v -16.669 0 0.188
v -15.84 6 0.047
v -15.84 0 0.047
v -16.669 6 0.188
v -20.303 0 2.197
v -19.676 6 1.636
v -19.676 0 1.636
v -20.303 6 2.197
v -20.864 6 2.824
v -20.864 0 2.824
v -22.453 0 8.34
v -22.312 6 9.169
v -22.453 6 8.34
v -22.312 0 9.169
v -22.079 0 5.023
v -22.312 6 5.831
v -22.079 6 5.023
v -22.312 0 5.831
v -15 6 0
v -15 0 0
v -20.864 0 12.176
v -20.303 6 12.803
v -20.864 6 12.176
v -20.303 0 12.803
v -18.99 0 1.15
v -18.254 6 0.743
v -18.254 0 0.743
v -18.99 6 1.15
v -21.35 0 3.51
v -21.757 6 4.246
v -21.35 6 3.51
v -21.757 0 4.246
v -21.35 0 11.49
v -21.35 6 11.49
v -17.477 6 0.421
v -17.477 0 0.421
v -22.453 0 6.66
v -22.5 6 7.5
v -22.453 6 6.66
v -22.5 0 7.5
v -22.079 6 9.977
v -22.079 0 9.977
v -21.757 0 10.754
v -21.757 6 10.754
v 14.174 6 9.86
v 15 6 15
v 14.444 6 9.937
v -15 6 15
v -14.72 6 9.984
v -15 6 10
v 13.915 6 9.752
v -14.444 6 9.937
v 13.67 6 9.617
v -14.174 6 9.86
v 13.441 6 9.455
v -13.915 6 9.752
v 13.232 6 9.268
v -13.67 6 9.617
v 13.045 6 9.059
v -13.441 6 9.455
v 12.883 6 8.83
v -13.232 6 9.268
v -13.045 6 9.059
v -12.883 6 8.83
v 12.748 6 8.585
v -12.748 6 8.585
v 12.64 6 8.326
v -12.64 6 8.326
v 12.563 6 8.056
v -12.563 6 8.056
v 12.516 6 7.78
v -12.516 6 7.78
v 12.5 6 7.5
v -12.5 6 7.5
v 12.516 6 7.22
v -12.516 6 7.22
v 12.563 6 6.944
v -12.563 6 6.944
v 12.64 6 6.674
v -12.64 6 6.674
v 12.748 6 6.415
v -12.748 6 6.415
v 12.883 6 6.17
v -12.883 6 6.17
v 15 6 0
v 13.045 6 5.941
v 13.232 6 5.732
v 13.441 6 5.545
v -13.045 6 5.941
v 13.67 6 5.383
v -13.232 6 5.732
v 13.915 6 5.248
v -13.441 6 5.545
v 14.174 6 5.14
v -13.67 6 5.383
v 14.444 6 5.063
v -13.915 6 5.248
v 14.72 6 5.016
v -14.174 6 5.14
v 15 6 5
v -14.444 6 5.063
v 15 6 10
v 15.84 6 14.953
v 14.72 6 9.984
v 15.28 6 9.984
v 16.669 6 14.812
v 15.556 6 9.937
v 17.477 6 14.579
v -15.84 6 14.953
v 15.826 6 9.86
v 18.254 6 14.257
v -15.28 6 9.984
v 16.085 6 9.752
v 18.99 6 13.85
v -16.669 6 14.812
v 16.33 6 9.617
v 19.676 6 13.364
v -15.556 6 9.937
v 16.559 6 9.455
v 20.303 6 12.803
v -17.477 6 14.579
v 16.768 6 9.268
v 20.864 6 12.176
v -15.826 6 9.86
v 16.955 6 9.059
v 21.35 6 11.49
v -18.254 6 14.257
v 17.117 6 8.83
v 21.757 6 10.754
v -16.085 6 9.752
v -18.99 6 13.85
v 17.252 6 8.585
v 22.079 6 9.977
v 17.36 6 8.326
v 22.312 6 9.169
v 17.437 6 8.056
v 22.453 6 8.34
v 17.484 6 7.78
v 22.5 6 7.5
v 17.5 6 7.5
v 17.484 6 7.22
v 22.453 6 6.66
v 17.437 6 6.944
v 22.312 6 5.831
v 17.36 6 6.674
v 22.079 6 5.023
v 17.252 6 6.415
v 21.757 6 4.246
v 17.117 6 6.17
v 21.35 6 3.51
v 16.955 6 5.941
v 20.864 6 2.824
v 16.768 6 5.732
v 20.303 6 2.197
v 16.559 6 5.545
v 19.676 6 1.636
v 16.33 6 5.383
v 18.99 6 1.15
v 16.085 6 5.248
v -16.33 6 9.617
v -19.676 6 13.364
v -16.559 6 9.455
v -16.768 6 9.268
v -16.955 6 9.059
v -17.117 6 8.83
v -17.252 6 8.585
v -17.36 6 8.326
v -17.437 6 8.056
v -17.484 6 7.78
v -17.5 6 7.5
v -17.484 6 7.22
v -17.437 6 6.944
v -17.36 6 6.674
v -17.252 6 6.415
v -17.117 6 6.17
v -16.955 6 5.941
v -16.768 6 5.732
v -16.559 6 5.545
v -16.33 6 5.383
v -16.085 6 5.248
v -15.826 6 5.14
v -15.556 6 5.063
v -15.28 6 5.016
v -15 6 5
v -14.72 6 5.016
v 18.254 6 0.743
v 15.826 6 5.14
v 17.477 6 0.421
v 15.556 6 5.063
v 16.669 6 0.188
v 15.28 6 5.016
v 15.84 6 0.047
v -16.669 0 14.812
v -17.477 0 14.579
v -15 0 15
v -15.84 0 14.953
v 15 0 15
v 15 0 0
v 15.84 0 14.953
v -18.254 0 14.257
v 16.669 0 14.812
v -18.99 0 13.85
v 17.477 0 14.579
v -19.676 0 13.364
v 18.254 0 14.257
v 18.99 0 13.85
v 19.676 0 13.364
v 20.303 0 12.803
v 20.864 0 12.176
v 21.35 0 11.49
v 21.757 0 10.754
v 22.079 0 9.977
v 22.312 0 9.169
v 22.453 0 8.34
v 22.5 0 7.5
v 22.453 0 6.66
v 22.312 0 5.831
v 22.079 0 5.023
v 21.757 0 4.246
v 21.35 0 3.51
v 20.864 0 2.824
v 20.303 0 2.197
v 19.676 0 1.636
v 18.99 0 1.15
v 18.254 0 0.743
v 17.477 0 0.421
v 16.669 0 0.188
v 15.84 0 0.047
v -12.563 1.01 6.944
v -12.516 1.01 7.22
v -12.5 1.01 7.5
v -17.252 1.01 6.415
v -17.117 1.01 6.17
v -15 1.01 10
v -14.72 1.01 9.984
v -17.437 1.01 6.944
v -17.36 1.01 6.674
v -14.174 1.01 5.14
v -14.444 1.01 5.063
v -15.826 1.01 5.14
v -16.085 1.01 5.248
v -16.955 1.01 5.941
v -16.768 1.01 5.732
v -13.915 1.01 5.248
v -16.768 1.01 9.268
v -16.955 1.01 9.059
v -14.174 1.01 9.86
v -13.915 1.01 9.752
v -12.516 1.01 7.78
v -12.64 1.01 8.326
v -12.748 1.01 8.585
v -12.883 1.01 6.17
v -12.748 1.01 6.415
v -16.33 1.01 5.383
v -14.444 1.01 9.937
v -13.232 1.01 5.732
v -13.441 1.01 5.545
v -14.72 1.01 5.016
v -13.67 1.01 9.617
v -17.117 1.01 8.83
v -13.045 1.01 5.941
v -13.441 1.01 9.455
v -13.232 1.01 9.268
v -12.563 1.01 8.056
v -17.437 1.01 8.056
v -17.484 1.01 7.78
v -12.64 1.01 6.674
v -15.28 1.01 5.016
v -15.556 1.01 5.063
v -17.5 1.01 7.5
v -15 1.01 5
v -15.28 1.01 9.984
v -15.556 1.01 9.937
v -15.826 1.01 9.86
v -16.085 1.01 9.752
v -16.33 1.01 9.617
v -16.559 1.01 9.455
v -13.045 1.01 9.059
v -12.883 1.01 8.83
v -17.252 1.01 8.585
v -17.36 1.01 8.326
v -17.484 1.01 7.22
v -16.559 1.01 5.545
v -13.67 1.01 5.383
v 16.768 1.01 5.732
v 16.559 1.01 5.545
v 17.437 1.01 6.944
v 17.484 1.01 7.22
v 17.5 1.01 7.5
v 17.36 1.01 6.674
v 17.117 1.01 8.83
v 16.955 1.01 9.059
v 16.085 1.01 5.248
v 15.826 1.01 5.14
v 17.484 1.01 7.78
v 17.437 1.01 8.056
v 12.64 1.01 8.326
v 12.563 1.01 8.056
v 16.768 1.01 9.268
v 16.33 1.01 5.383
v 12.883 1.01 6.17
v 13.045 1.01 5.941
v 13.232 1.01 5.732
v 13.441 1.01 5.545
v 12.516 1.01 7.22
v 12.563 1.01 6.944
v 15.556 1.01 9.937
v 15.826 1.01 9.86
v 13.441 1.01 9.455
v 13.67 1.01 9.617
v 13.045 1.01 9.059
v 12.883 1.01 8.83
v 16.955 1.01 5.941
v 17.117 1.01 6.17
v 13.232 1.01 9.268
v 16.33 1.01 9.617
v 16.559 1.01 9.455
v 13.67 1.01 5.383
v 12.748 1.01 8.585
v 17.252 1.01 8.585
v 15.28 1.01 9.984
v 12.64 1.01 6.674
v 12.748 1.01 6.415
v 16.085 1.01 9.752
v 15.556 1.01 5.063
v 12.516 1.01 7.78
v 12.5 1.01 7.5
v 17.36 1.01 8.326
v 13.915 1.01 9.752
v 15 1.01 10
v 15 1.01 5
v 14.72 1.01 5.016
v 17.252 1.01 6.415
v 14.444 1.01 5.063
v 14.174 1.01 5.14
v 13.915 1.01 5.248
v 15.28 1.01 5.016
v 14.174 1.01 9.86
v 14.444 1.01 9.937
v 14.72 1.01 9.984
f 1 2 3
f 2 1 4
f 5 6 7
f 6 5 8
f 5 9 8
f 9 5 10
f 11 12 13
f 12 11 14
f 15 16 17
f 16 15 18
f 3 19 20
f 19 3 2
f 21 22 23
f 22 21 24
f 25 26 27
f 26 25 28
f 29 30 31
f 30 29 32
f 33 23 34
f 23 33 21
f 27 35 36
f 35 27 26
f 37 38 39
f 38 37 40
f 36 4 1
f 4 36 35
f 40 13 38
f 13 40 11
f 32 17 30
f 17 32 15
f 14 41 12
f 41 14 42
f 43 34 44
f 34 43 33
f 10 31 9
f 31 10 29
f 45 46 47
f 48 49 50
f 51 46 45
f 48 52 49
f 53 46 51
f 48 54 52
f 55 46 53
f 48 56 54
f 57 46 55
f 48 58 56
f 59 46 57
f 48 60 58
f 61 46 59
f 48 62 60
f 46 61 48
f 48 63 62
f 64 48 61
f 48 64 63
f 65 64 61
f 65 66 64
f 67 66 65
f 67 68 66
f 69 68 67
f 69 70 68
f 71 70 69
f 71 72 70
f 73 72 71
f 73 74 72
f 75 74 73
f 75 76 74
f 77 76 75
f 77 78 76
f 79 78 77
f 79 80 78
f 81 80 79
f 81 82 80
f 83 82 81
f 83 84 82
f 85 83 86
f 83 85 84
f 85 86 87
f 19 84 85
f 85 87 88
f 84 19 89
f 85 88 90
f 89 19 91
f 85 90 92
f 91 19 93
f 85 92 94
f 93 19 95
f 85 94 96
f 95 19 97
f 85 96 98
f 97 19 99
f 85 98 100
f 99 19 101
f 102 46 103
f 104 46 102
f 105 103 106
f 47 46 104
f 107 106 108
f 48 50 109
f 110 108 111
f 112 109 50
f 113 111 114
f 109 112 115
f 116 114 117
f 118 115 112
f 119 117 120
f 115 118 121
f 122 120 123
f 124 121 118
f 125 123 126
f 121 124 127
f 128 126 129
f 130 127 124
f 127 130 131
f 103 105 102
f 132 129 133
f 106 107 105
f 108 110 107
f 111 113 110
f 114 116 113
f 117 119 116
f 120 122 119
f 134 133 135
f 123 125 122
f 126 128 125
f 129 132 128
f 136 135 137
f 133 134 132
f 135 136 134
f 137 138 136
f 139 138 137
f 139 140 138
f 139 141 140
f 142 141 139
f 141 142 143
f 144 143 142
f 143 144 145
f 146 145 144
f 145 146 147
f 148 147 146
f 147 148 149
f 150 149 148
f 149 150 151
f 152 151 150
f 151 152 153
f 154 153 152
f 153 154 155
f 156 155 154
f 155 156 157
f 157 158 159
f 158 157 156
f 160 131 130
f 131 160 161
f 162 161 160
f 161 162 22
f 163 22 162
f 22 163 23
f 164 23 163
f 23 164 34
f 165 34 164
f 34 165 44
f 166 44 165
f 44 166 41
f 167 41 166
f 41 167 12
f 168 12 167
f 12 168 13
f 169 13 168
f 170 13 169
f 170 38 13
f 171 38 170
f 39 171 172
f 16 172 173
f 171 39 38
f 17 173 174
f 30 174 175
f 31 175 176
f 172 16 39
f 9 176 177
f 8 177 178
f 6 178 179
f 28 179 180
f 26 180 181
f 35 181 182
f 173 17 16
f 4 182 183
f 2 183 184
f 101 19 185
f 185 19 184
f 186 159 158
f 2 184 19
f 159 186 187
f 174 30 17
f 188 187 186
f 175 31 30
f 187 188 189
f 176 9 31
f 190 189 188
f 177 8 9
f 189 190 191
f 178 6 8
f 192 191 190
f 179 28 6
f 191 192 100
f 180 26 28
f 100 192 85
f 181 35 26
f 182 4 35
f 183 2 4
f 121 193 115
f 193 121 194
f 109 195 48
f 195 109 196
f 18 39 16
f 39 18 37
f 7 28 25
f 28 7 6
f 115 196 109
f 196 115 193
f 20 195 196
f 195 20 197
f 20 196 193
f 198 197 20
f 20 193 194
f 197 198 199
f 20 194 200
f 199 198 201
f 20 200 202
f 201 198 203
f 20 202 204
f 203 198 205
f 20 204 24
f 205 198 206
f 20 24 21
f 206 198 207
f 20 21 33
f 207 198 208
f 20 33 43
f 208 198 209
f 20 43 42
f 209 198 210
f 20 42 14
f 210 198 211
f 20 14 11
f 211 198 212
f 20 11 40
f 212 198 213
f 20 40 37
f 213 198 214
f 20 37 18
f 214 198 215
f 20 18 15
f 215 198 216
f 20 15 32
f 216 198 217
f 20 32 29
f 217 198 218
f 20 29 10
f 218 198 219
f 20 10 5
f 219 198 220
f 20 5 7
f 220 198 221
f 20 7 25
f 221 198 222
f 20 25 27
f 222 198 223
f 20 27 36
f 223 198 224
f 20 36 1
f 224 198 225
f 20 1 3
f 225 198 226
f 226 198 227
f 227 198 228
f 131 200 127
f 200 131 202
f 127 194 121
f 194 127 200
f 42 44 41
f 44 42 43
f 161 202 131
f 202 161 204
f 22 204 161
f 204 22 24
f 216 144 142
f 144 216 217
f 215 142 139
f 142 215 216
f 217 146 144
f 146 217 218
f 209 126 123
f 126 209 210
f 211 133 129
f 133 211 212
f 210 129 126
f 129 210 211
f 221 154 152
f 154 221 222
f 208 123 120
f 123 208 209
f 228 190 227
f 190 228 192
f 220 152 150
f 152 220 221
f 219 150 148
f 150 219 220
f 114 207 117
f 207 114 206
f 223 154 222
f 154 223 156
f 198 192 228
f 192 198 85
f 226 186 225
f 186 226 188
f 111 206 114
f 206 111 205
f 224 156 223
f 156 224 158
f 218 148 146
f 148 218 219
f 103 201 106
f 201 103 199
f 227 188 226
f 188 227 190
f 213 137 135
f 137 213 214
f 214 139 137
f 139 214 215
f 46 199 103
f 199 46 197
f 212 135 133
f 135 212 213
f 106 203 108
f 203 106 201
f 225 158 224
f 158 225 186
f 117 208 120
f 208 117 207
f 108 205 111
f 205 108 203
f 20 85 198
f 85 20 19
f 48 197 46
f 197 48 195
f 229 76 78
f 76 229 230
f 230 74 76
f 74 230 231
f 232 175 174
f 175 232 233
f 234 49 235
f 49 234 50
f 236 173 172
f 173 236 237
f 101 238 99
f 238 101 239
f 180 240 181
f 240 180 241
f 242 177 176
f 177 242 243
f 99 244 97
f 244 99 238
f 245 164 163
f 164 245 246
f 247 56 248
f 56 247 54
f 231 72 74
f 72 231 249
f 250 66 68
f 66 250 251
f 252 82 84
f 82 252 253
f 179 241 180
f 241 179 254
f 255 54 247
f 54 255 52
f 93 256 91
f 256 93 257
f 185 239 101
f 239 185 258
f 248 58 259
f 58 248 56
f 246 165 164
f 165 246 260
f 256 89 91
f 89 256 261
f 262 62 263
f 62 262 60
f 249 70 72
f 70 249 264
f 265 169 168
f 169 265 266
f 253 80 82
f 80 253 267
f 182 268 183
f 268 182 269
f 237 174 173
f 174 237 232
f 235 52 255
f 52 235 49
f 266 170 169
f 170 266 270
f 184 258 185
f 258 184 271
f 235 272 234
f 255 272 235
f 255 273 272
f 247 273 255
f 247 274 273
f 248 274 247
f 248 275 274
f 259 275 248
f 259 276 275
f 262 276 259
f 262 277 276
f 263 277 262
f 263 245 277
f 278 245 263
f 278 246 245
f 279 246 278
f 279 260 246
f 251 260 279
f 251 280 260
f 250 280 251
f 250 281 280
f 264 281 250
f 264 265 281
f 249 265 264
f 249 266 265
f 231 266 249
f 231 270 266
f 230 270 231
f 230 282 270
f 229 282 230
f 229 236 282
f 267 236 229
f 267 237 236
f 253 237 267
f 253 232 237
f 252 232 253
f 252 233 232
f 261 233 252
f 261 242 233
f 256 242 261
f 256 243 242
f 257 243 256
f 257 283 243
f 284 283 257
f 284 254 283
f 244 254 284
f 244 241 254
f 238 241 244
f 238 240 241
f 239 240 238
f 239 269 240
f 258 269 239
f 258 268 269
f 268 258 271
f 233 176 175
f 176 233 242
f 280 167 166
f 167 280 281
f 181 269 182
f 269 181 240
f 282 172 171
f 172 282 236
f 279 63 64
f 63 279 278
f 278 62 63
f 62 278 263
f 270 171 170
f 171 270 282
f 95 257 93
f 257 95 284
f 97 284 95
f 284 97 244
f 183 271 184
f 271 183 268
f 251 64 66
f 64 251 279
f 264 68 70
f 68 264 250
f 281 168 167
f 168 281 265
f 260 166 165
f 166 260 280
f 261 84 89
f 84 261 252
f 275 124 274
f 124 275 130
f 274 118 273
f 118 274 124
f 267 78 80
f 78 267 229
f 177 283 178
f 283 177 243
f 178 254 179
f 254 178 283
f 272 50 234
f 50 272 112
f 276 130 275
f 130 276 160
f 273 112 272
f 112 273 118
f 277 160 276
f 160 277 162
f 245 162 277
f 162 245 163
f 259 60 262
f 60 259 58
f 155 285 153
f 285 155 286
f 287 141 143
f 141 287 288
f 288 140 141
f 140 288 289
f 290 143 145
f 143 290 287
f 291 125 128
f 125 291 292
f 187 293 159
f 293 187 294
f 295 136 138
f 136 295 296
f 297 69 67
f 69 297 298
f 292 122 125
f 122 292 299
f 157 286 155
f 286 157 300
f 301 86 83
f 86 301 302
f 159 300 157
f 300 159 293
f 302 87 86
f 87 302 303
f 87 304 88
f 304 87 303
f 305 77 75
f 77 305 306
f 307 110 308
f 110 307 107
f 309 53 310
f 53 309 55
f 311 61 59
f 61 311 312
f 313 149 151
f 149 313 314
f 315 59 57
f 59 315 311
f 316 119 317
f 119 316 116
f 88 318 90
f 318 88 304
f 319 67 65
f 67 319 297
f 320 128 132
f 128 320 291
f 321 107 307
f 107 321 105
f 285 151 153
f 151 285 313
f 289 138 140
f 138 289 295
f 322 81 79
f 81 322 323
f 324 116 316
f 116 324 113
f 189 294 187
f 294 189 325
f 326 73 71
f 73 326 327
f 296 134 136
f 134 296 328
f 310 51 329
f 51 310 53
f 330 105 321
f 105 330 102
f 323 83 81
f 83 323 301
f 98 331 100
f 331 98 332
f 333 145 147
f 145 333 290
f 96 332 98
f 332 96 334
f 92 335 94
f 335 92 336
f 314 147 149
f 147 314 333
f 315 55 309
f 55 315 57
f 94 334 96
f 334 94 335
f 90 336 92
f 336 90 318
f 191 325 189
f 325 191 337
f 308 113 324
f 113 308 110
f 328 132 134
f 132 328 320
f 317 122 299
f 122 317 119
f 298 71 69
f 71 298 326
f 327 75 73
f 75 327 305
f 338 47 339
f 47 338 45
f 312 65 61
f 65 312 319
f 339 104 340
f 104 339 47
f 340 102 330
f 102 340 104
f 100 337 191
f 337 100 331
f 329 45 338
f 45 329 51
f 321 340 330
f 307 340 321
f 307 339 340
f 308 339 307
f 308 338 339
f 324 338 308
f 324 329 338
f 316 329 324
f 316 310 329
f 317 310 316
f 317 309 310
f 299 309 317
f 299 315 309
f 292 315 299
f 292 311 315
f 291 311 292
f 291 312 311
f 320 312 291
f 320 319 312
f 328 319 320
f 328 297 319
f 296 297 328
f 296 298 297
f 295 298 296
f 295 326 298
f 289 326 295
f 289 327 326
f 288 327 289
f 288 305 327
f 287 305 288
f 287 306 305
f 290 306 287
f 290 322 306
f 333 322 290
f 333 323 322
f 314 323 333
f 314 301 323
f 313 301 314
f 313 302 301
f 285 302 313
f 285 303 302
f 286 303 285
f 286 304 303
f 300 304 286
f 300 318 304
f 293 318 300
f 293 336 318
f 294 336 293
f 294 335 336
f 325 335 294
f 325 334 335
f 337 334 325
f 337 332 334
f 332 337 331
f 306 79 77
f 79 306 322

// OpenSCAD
// file: params.scad
// ============================================================================
//  Pi-Gaze / params.scad
//  Единый источник размеров. Всё остальное считается отсюда.
//  Единицы: мм.
//
//  ИСТОЧНИКИ ДАННЫХ:
//   [D] официальный механический чертёж Raspberry Pi 5
//       (datasheets.raspberrypi.com/rpi5/raspberry-pi-5-mechanical-drawing.pdf)
//   [M] замер пользователя штангенциркулем
//   [S] отраслевой стандарт разъёма
// ============================================================================

$fn = 56;

// ---------------------------------------------------------------- материалы
WALL      = 2.5;    // основная стенка
LID_TH    = 3.2;    // крышки (магнит 2 + потолок 0.4 + корка 0.8)
FIT       = 0.35;   // зазор бортиков крышек
CHAM      = 0.8;    // фаска-заход у проёмов разъёмов

// ------------------------------------------------------------------ магниты
// N42 диск 5 x 2 (заказаны)
MAG_D     = 5.0;
MAG_H     = 2.0;
MAG_FIT   = 0.2;
MAG_PD    = MAG_D + MAG_FIT;
MAG_CEIL  = 0.4;    // потолок над магнитом -> впаивается на паузе, снаружи не видно

// -------------------------------------------------------------- термовтулки
// ВАЖНО (правило heat-set): отверстие под втулку ВСЕГДА чуть МЕНЬШЕ её наружного
// (накатанного) диаметра — расплавленный пластик затекает в накатку и держит.
// Значения ниже — типовые рекомендованные отверстия; сверь с даташитом своих втулок.
// Втулки остаются ТОЛЬКО в креплении платы (M2.5). Всё прочее — гайки в карманах.
INS_M2_D  = 3.2;  INS_M2_L  = 4.0;
INS_M25_D = 3.5;  INS_M25_L = 5.0;   // <- крепление платы (отверстия Pi Ø2.7 => только M2.5)
INS_M3_D  = 4.0;  INS_M3_L  = 5.7;
INS_M5_D  = 6.4;  INS_M5_L  = 9.5;
INS_SLACK = 1.5;  // запас глубины под вытесненный пластик
BOSS_WALL = 2.0;  // мин. пластик вокруг втулки

// ------------------------------------------------------- гайки в карманах (M3)
// Единый крепёж корпуса — M3 винт + обычная M3-гайка в напечатанном кармане.
// ПРОВЕРЬ гайки: AF = размер под ключ (грани), TH = толщина.
NUT_M3_AF  = 5.5;   // M3 гайка, под ключ (DIN934/ISO4032)
NUT_M3_TH  = 2.4;   // M3 гайка, толщина
NUT_FIT    = 0.35;  // зазор карман/гайка (снуг, чтобы не проворачивалась)
SCREW_M3_D = 3.4;   // проход под винт M3 (+зазор)
SCREW_M25_D= 2.9;   // проход под винт M2.5

// =========================================================== RASPBERRY PI 5
// Плата 85 x 56 [D]. В корпусе стоит ребром CAM/DISP ВВЕРХ (поворот 90° CW),
// поэтому в координатах корпуса: X = 56 мм, Z = 85 мм.
PCB_X = 56;
PCB_Z = 85;
PCB_T = 1.6;

// Крепёж [D]: вдоль ребра 85 -> 3.5 и 61.5 ; вдоль ребра 56 -> 3.5 и 52.5.
// После поворота: X_b = Y_d ; Z_b = 85 - X_d
HOLE_X = [3.5, 52.5];
HOLE_Z = [23.5, 81.5];

// --- РАЗЪЁМЫ: позиции центров от угла платы (min X, min Z) --------------
// НИЗ (ребро 56, в чертеже правое): Ethernet, USB-стек, USB-стек [D]
P_BOTTOM = [10.2, 29.1, 47.0];
// ЛЕВО (ребро 85, в чертеже нижнее): USB-C, micro-HDMI 0, micro-HDMI 1
// (в чертеже 11.2/25.8/39.2 от левого края -> Z_b = 85 - X_d)
P_LEFT   = [73.8, 59.2, 45.8];

// --- РАЗЪЁМЫ: проём [ширина вдоль ребра, высота над платой] -------------
// ТЕЛА РАЗЪЁМОВ ИЗМЕРЕНЫ НА РЕАЛЬНОЙ 3D-МОДЕЛИ [S3D]
// (RASPBERRY_PI_5_WITH_ACTIVE_COOLER.stl, ~120k tri). Плата в модели центрирована
// в 0: нижняя медь A[-42.5,+42.5]=85, B[-28,+28]=56. Отображение в корпус
// (собственный поворот, кулер к крышке +Y, LAN/USB вниз -Z):  worldX = B ,
// worldZ = 48 - A. Центры разъёмов ПОДТВЕРДИЛИСЬ до 0.1 мм с чертёжными:
//   RJ45   центр worldX +17.8 (тело 15.90 x 13.68)
//   USB-A  центры worldX -1.1 / -19.0 (тело 13.25 x 15.80 — стек 2xUSB)
//   USB-C  центр worldZ 79.3 (тело 8.94 x 3.16)
//   HDMI   центры worldZ 64.7 / 51.3 (тело 6.50 x 2.88)
// ПРОЁМ = тело + ~0.7 мм суммарного зазора (0.35 на сторону) — снуг для FDM.
// Прежде C_USB высота 15.7 = телу 15.8 (нулевой зазор!) -> поднято до 16.5.
C_LAN    = [16.6, 14.4];   // 15.90 + 0.7  x  13.68 + 0.7
C_USB    = [14.0, 16.5];   // 13.25 + 0.75 x  15.80 + 0.7
C_USBC   = [ 9.6,  4.6];   //  8.94 + 0.66 x   3.16 + запас под штекер
C_HDMI   = [ 7.3,  4.4];   //  6.50 + 0.8  x   2.88 + запас под штекер
C_SD     = [13.0,  3.5];   // microSD, на нижней стороне у USB-C [S3D] (наружу НЕ выводим)

// --- прочее по плате
COOLER_H  = 15;   // Active Cooler над платой (VERIFY по STEP)
FAN_GAP   = 8;    // ОБЯЗАТЕЛЬНЫЙ зазор над турбинкой (иначе задыхается)
STAND_H   = 4.5;  // высота опор: зазор под пины кулера и нижние компоненты

// ============================================================ CAMERA MODULE 3
CAM_X = 25; CAM_Z = 24; CAM_T = 11.5;   // 25 x 24 x 11.5 [офиц. product brief]
CAM_FIT = 0.3;
CAM_LENS_D = 9;     // окно объектива
HOOD_H = 4;         // бленда (режет засветку от комнаты/экрана)

// ================================================================== ИК-ПОДСВЕТКА
// Vishay TSHA5203, 5 мм, 875 нм, ±12°, рабочий ток 20 мА
IR_WELL_D = 5.05;   // глухой колодец (press-fit, буртик не даёт провалиться)
IR_APER_D = 3.6;    // выходная апертура = светозащитный барьер к объективу
IR_SPACING = 44;    // база между диодами (dark-pupil: вынос от оси >= 15)

// ===================================================================== CH9329
// UART -> USB HID (мышь+клавиатура). ПРОВЕРЬ свой модуль.
CH_L = 34; CH_W = 15; CH_T = 9;
// file: lib.scad
// ============================================================================
//  Pi-Gaze / lib.scad — примитивы. Ничего проектного, только геометрия.
// ============================================================================
include <params.scad>

// Скруглённый прямоугольник (2D)
module rrect(w,h,r){ minkowski(){ square([w-2*r,h-2*r],center=true); circle(r=r); } }

// Коробка со скруглёнными вертикальными рёбрами: центр в XY, z = 0..h
// ВАЖНО: радиус ограничивается габаритом. Иначе при w < 2*r hull выворачивается
// наизнанку и деталь РАЗДУВАЕТСЯ (тонкая пластина 3.2 превращалась в 12.8).
module rbox(l,w,h,r=3){
  rr = min(r, l/2-0.01, w/2-0.01);
  hull() for(x=[rr-l/2,l/2-rr]) for(y=[rr-w/2,w/2-rr])
    translate([x,y,0]) cylinder(r=rr,h=h);
}
// То же, но центр по всем осям
module rbox3(l,w,h,r=3){ translate([0,0,-h/2]) rbox(l,w,h,r); }

// Выдавливание вдоль +Y (локально): удобно для стенок корпуса
module extrudeY(len){ rotate([-90,0,0]) linear_extrude(len) children(); }

// ---------------------------------------------------------------- термовтулки
// Отверстие под запрессовку с заходным конусом. Ось +Z, устье на z=0.
module insert_hole(d,l){
  union(){
    cylinder(d=d, h=l+INS_SLACK);
    translate([0,0,-0.01]) cylinder(d1=d+1.2, d2=d, h=1.0);
  }
}
// Бобышка под втулку: цилиндр высотой h, втулка запрессовывается с ТОРЦА (z=h)
module boss(d_ins,l_ins,h){
  difference(){
    cylinder(d=d_ins+2*BOSS_WALL, h=h);
    translate([0,0,h-l_ins-INS_SLACK]) insert_hole(d_ins,l_ins);
  }
}

// ------------------------------------------------------------------- магниты
// Карман под магнит, открытый в +Y, с потолком MAG_CEIL со стороны faceY.
// Печатается стыковой гранью вверх -> на паузе кладём магнит, слои замуровывают.
module mag_pocket_pY(faceY){
  translate([0,faceY-MAG_CEIL,0]) rotate([90,0,0]) cylinder(d=MAG_PD,h=MAG_H);
}
// То же, зеркально: потолок со стороны -Y
module mag_pocket_nY(faceY){
  translate([0,faceY+MAG_CEIL,0]) rotate([-90,0,0]) cylinder(d=MAG_PD,h=MAG_H);
}

// ------------------------------------------------------------- проёмы разъёмов
// Прямоугольный проём с фаской-заходом по НАРУЖНОЙ грани.
// Локально: сквозь по +Z, наружная грань на z=thick. w вдоль X, h вдоль Y.
module port_slot(w,h,thick){
  translate([0,0,-0.1]) linear_extrude(thick+0.2) square([w,h],center=true);
  translate([0,0,thick-CHAM])
    linear_extrude(CHAM+0.1, scale=[(w+2*CHAM)/w,(h+2*CHAM)/h]) square([w,h],center=true);
}

// ---------------------------------------------------------------- вентиляция
// Сквозная щель в стенке, нормаль которой = ось X. sx = -1 (левая) / +1 (правая).
// Куб центрируется НА стенке -> гарантированно прорезает насквозь.
module vent_x(sx, xface, ycen, zcen, len, thickness=2.4){
  translate([sx*xface, ycen, zcen]) cube([WALL*3, len, thickness], center=true);
}

// ------------------------------------------------------- гайка в кармане (nut-trap)
// РЕЖУЩИЙ инструмент (вычитается). Ось винта = +Z.
//  - сквозной проход под винт по всей высоте (обе стороны);
//  - шестигранный карман под гайку у -Z конца, ОТКРЫТ в -Z (туда вставляется гайка).
// Ориентируй rotate/translate так, чтобы карман открывался на доступную грань
// (или замуровывался соседней деталью — тогда гайка не выпадет).
module nut_trap_cut(af=NUT_M3_AF, nt=NUT_M3_TH, sd=SCREW_M3_D, thru=20){
  translate([0,0,-thru]) cylinder(d=sd, h=2*thru);                               // проход винта насквозь
  // гекс-карман: across-flats = af+NUT_FIT  =>  d(across-corners) = (af+NUT_FIT)/cos(30)
  translate([0,0,-nt]) cylinder(d=(af+NUT_FIT)/cos(30), h=nt+0.02, $fn=6);
}

// Бобышка под термовтулку, ось +Y (устье втулки смотрит в +Y). Для крепления платы.
module boss_pinsertY(y0, h, d_ins, l_ins){
  translate([0, y0, 0]) rotate([-90,0,0]) difference(){
    cylinder(d=d_ins+2*BOSS_WALL, h=h);
    translate([0,0,h-l_ins-INS_SLACK]) insert_hole(d_ins, l_ins);
  }
}
// main file
include <lib.scad>


hole = 4; //hole diamter
rail_thk = 1.0;
rail_base = 27;
rail_hgt = 7.5;
rail_wid = 35;
rail_lip = 0.5 * (rail_wid - rail_base) + rail_thk;
slot_len = 18.0;
slot_wid = 6.3;
slot_c2c = 25.0;
slot_gap = slot_c2c - slot_len;
slot_hole_c2c = slot_len - slot_wid;
module make_din_rail( length ) {
  color("silver") {
  // draw the edges and lips
  translate([rail_hgt-rail_thk,0.5*rail_base-rail_thk,0]) 
    cube([rail_thk,rail_lip,length]);
  translate([0,0.5*rail_base-rail_thk,0]) 
    cube([rail_hgt,rail_thk,length]);;
  mirror([0,1,0]) {
    translate([rail_hgt-rail_thk,0.5*rail_base-rail_thk,0]) 
      cube([rail_thk,rail_lip,length]);
    translate([0,0.5*rail_base-rail_thk,0]) 
      cube([rail_hgt,rail_thk,length]);;
  }

  difference() {
    // base rail
    translate([0,-0.5*rail_base,0]) 
      cube([rail_thk,rail_base,length]);
    // holes
    for(z= [0:slot_c2c:length-0.5*slot_gap]) {
      translate([-0.5*rail_thk,0,z+0.5*slot_wid+0.5*slot_gap])
      rotate([0,90,0])  
      hull() {
        translate([-slot_hole_c2c,0,0])
          cylinder(h=2*rail_thk,d=slot_wid, $fn=30);
        cylinder(h=2*rail_thk,d=slot_wid, $fn=30);
      }
    }  
  }
  }
}

module place_din_rail(length=100) {
  rotate(-90,[1,0,0])
  rotate(-90,[0,0,1])
  make_din_rail(length);
}

module place( thing, align=[0,0,-1]) {
  translate([
    -align.x*0.5*thing.x, 
    -align.y*0.5*thing.y, 
    -align.z*0.5*thing.z])
    children();
}
module place_cube( thing, align=[0,0,-1]) {
  translate([
    -align.x*0.5*thing.x, 
    -align.y*0.5*thing.y, 
    -align.z*0.5*thing.z])
    cube(thing, center=true);
}
    
    

clamp_width = 15;
clamp_color = "darkolivegreen";
module make_clamp_base() {
  color(clamp_color)
  translate([0,0.5*clamp_width,0])
  difference() {
    rotate(90,[1,0,0])
      linear_extrude(height=clamp_width, convexity=10)
        import("din-rail-clamp.dxf");
    // screwdriver release slot/pocket
    box = [1.25, clamp_width-3, 5 ];
    translate([-18.6,-1,-13.8])
      place(box, [1,1,-1])
        cube(box, center=true);
  }
}
module print_clamp_base() {
  rotate(270,[1,0,0])
    translate([0,-0.5*clamp_width,0])
      make_clamp_base();
}


pca = [ 30, clamp_width, 6 ];
pca_dia = 15;
m3_insert_dia = 5;
m3_insert_deep = 5;
hole_spacing = 30;
hole_xposns = [ -0.5*hole_spacing, +0.5*hole_spacing ];
module make_panel_controller_adaptor() {
  make_clamp_base();
  color(clamp_color)
  difference() {
    union() { // make dog bone shape
      place_cube(pca, [0,0,-1]);
      for(x=hole_xposns) 
        translate([x,0,0])
          cylinder( d=pca_dia, h=pca.z );
    }
    for(x=hole_xposns)
      translate([x,0,pca.z-m3_insert_deep+0.01])
        cylinder( d=m3_insert_dia, h=m3_insert_deep );
  }
}
module print_panel_controller_adaptor() {
  rotate(270,[1,0,0])
    translate([0,-0.5*clamp_width,0])
      make_panel_controller_adaptor();
}

*translate([0,0,-16.5])
  place_din_rail(30);

* make_clamp_base();
*make_panel_controller_adaptor();
print_panel_controller_adaptor();

* print_clamp_base();
